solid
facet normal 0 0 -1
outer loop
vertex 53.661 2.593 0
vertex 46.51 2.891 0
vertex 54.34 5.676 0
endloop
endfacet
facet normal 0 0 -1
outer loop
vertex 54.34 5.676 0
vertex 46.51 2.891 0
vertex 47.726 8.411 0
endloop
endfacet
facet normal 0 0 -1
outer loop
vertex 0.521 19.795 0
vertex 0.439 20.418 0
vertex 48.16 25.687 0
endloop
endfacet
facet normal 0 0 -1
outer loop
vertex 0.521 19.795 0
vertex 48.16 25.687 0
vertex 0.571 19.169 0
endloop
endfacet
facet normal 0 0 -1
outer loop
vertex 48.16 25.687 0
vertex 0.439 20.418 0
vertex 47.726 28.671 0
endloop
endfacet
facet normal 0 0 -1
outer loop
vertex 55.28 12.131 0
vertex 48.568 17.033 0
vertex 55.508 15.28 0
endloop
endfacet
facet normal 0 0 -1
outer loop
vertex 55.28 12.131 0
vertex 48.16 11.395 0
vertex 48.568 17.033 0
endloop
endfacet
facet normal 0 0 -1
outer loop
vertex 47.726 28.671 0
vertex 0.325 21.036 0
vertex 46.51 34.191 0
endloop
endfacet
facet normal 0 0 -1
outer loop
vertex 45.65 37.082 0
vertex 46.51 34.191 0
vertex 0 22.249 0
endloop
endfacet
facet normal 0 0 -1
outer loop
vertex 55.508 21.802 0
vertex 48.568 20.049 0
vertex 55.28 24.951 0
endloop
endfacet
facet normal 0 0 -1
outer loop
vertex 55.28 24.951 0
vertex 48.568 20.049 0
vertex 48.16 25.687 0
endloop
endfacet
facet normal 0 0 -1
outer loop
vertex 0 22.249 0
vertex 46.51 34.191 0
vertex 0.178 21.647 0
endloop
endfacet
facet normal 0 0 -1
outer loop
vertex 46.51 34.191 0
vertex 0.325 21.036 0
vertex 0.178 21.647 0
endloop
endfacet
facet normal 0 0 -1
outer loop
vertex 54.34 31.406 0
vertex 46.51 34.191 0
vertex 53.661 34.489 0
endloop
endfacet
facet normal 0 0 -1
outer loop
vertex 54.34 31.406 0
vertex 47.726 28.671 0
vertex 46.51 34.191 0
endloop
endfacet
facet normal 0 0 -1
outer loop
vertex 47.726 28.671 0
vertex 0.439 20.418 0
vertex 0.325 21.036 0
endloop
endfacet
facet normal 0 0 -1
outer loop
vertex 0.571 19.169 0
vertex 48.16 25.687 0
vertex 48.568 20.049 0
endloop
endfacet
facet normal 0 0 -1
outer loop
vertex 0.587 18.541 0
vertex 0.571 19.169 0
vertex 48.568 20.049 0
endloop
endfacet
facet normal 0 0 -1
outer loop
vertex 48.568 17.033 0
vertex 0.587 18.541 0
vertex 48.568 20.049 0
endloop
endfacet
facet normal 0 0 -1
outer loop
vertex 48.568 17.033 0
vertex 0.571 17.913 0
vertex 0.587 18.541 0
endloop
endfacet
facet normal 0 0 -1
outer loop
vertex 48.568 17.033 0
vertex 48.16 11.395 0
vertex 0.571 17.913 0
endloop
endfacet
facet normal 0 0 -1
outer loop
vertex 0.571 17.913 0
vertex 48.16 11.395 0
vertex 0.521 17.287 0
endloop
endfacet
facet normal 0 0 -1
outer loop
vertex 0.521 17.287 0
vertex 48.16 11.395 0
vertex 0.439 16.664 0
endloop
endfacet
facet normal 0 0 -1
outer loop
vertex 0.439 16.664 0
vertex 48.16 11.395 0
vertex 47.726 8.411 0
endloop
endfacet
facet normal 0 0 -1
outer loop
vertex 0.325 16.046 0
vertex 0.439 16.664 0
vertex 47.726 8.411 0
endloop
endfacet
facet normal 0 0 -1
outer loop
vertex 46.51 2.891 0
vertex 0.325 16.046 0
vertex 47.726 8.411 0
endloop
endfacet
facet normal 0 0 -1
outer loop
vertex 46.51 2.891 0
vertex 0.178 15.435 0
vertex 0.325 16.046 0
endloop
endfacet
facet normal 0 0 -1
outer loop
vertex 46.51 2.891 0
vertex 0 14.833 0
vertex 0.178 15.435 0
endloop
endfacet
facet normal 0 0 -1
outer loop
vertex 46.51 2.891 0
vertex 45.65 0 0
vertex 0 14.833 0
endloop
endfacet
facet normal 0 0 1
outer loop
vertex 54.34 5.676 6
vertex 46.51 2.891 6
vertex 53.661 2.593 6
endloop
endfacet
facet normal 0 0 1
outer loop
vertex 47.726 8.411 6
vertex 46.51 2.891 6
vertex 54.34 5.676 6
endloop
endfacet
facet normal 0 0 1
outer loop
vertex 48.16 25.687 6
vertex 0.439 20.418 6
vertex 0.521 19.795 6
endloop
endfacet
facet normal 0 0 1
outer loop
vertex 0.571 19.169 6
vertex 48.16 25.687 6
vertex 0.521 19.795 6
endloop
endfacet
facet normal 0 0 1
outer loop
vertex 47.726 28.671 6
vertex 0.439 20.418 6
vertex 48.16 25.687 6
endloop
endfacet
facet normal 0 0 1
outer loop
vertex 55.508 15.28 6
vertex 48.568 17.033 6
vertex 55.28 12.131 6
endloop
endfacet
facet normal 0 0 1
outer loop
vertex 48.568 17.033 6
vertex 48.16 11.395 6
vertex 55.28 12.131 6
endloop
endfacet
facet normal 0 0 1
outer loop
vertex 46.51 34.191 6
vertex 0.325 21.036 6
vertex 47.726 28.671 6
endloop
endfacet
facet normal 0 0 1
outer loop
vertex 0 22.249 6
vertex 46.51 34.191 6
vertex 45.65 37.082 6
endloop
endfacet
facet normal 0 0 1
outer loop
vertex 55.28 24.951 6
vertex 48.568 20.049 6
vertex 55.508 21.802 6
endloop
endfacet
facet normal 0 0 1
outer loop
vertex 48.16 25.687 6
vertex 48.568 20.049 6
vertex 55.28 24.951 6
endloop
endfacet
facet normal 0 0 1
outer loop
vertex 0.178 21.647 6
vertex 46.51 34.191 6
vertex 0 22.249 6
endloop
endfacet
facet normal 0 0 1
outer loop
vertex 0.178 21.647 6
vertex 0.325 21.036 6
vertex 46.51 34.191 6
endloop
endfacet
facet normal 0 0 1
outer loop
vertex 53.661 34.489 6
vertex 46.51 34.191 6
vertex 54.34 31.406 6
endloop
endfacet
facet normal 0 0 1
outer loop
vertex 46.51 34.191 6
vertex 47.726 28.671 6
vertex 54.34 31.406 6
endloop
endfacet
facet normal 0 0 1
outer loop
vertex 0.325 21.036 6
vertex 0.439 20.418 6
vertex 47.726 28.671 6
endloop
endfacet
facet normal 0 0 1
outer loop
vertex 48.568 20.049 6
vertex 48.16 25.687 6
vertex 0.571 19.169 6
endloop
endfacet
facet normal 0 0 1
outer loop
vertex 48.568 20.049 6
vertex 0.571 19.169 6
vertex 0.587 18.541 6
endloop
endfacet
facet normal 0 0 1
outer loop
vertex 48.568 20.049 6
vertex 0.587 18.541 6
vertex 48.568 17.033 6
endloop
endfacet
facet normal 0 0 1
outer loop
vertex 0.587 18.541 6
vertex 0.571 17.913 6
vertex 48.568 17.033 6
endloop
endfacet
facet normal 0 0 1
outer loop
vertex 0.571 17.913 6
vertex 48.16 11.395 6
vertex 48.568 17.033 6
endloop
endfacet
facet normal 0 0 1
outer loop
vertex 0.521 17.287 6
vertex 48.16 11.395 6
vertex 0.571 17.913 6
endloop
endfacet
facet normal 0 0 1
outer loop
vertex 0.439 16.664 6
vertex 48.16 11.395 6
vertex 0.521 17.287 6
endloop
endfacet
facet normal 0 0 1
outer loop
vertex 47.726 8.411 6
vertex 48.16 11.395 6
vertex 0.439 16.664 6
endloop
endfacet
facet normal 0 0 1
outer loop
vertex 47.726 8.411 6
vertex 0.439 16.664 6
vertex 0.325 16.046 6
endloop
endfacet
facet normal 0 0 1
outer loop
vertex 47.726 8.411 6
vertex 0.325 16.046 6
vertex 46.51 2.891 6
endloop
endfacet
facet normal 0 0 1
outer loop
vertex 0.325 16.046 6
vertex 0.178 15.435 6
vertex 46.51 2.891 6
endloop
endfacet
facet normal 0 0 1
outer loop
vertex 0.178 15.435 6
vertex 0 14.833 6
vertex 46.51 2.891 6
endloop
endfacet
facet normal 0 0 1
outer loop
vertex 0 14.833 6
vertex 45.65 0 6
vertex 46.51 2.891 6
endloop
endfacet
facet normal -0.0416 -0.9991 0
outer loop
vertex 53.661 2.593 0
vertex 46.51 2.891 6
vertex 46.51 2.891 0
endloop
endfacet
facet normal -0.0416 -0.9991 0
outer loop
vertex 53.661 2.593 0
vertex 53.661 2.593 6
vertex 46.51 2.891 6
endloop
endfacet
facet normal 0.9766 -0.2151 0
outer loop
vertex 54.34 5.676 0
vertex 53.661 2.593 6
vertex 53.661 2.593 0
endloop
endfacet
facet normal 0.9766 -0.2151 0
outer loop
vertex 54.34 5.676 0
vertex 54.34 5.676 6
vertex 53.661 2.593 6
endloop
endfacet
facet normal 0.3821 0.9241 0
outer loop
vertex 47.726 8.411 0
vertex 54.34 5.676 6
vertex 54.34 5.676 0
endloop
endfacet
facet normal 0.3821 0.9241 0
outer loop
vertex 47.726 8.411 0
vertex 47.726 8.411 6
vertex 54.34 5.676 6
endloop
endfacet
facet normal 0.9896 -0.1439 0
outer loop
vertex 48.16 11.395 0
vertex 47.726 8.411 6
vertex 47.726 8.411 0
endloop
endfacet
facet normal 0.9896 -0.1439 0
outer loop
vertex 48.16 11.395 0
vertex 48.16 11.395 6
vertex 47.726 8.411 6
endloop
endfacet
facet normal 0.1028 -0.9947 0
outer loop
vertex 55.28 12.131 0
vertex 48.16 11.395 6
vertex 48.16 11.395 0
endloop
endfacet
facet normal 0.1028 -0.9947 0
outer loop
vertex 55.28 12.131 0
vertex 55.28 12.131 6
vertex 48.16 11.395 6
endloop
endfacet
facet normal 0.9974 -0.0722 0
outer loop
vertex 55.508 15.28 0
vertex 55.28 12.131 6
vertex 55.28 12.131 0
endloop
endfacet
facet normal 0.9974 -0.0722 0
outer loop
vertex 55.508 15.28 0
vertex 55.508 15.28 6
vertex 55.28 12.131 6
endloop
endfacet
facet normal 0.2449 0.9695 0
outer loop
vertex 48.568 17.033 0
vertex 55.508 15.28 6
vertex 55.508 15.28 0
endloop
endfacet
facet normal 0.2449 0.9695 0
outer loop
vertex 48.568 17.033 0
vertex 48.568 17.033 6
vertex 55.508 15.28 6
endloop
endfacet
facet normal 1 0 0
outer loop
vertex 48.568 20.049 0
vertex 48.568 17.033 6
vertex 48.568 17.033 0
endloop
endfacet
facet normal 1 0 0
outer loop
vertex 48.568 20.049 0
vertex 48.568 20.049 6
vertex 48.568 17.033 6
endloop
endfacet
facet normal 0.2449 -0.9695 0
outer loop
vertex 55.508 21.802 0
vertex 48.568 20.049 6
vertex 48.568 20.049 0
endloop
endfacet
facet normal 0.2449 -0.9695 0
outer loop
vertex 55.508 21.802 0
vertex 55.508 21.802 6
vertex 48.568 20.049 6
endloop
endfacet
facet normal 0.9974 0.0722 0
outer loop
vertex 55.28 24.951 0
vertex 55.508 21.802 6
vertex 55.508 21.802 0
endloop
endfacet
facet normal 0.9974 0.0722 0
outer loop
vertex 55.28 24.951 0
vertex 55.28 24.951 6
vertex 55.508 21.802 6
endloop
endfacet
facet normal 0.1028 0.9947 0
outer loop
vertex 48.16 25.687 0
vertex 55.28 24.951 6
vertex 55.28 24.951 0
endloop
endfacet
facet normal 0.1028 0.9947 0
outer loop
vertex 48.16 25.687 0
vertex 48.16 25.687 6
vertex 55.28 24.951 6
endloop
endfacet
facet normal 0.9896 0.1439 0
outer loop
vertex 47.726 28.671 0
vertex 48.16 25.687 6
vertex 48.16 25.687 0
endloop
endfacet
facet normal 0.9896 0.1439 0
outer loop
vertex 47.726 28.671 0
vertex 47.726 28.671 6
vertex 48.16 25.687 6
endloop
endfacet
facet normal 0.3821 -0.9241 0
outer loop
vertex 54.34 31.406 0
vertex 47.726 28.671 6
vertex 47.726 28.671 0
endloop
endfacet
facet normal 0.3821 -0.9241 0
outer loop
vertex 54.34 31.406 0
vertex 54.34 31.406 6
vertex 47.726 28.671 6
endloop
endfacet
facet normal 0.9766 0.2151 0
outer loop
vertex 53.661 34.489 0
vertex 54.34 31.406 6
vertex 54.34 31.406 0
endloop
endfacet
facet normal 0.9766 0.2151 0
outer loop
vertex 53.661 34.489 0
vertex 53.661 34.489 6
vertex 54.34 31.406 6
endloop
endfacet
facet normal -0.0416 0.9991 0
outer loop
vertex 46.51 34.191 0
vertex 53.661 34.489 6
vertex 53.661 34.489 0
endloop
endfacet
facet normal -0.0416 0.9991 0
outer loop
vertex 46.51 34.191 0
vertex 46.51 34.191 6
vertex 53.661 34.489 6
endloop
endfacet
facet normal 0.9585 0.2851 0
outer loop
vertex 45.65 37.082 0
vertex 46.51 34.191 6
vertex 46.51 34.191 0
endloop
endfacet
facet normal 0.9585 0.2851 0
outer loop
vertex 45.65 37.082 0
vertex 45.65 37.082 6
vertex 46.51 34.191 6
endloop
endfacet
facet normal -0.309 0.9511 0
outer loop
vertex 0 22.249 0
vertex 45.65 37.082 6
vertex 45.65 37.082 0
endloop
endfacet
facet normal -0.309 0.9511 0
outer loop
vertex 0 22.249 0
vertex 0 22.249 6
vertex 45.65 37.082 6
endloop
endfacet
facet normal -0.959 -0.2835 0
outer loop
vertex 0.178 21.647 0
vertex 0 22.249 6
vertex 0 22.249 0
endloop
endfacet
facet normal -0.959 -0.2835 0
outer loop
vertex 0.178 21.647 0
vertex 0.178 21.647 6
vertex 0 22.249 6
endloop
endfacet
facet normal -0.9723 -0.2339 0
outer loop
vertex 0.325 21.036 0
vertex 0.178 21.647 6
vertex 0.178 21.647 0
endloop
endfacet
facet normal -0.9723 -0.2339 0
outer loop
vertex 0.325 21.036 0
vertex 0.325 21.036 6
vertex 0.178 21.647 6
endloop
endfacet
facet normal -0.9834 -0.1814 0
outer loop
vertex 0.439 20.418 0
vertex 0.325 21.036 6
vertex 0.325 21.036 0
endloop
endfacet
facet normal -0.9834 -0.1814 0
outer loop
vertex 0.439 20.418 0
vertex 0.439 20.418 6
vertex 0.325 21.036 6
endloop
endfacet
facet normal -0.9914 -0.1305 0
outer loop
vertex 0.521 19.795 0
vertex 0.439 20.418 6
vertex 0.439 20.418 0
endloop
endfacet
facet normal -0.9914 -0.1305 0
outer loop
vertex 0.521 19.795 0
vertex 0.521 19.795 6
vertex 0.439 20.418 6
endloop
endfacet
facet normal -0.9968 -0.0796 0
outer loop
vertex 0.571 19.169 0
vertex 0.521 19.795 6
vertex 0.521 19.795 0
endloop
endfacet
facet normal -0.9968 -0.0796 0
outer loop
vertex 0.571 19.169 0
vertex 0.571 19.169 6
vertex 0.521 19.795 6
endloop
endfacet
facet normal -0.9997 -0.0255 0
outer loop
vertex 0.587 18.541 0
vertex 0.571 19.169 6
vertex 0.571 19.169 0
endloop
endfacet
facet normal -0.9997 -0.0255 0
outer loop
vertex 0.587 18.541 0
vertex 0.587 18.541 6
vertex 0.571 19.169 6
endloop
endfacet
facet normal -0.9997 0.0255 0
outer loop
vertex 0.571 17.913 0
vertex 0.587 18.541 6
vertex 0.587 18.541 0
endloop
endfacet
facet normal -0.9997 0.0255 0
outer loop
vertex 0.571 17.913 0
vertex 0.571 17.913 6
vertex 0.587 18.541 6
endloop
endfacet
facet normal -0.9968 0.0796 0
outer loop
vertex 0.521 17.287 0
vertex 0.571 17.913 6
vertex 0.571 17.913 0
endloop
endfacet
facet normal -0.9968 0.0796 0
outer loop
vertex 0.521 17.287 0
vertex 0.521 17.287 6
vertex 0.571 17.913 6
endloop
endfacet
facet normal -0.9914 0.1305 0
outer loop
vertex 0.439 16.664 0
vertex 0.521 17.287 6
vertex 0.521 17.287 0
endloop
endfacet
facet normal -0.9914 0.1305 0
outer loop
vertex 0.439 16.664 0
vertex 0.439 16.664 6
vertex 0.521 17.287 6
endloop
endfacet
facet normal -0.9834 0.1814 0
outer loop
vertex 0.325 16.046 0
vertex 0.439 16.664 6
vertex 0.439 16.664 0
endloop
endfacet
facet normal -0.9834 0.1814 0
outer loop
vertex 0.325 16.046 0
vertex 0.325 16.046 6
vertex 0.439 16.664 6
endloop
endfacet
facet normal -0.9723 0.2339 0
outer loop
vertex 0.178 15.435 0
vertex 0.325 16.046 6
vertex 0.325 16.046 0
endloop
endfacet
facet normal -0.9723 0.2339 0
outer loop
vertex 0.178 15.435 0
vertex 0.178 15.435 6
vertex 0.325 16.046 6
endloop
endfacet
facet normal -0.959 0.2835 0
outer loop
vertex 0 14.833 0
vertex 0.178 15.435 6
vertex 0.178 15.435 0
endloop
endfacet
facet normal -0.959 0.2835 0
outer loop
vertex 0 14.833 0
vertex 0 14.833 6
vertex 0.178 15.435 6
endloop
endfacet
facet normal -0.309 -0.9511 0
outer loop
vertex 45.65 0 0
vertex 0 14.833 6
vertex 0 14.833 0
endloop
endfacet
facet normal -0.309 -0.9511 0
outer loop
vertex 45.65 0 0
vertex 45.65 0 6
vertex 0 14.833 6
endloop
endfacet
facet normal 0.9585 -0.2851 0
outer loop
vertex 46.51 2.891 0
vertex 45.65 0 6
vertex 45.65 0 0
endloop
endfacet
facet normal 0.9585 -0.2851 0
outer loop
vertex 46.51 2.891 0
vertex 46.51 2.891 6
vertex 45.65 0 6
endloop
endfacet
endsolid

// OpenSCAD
$fn = 32;

// ----------------------------------------------------------------------
// Gear sector: 4 teeth on 36 degrees
// ----------------------------------------------------------------------

// --- parameters (mm) ---
sector_angle = 36;        // sector angle, degrees
root_r = 60;              // root circle radius
tooth_h = 7;              // tooth height over the root circle
teeth = 4;                // number of teeth on the sector
hub_r = 12;               // hub bore radius
plate_t = 6;              // sector thickness, Z
arc_step = 3;             // sampling step of the root/hub arcs, degrees
fit_tol = 0.1;            // declared fit tolerance (prompt contract)
free_tol = 0.3;           // declared free tolerance (prompt contract)

tip_r = root_r + tooth_h;  // tip circle radius

profile = [[45.65, 0], [46.51, 2.891], [53.661, 2.593], [54.34, 5.676], [47.726, 8.411], [48.16, 11.395], [55.28, 12.131], [55.508, 15.28], [48.568, 17.033], [48.568, 20.049], [55.508, 21.802], [55.28, 24.951], [48.16, 25.687], [47.726, 28.671], [54.34, 31.406], [53.661, 34.489], [46.51, 34.191], [45.65, 37.082], [0, 22.249], [0.178, 21.647], [0.325, 21.036], [0.439, 20.418], [0.521, 19.795], [0.571, 19.169], [0.587, 18.541], [0.571, 17.913], [0.521, 17.287], [0.439, 16.664], [0.325, 16.046], [0.178, 15.435], [0, 14.833]];  // primary outline, 31 points, counter clockwise

// --- the one profile operation ---
linear_extrude(height = plate_t) polygon(points = profile);
